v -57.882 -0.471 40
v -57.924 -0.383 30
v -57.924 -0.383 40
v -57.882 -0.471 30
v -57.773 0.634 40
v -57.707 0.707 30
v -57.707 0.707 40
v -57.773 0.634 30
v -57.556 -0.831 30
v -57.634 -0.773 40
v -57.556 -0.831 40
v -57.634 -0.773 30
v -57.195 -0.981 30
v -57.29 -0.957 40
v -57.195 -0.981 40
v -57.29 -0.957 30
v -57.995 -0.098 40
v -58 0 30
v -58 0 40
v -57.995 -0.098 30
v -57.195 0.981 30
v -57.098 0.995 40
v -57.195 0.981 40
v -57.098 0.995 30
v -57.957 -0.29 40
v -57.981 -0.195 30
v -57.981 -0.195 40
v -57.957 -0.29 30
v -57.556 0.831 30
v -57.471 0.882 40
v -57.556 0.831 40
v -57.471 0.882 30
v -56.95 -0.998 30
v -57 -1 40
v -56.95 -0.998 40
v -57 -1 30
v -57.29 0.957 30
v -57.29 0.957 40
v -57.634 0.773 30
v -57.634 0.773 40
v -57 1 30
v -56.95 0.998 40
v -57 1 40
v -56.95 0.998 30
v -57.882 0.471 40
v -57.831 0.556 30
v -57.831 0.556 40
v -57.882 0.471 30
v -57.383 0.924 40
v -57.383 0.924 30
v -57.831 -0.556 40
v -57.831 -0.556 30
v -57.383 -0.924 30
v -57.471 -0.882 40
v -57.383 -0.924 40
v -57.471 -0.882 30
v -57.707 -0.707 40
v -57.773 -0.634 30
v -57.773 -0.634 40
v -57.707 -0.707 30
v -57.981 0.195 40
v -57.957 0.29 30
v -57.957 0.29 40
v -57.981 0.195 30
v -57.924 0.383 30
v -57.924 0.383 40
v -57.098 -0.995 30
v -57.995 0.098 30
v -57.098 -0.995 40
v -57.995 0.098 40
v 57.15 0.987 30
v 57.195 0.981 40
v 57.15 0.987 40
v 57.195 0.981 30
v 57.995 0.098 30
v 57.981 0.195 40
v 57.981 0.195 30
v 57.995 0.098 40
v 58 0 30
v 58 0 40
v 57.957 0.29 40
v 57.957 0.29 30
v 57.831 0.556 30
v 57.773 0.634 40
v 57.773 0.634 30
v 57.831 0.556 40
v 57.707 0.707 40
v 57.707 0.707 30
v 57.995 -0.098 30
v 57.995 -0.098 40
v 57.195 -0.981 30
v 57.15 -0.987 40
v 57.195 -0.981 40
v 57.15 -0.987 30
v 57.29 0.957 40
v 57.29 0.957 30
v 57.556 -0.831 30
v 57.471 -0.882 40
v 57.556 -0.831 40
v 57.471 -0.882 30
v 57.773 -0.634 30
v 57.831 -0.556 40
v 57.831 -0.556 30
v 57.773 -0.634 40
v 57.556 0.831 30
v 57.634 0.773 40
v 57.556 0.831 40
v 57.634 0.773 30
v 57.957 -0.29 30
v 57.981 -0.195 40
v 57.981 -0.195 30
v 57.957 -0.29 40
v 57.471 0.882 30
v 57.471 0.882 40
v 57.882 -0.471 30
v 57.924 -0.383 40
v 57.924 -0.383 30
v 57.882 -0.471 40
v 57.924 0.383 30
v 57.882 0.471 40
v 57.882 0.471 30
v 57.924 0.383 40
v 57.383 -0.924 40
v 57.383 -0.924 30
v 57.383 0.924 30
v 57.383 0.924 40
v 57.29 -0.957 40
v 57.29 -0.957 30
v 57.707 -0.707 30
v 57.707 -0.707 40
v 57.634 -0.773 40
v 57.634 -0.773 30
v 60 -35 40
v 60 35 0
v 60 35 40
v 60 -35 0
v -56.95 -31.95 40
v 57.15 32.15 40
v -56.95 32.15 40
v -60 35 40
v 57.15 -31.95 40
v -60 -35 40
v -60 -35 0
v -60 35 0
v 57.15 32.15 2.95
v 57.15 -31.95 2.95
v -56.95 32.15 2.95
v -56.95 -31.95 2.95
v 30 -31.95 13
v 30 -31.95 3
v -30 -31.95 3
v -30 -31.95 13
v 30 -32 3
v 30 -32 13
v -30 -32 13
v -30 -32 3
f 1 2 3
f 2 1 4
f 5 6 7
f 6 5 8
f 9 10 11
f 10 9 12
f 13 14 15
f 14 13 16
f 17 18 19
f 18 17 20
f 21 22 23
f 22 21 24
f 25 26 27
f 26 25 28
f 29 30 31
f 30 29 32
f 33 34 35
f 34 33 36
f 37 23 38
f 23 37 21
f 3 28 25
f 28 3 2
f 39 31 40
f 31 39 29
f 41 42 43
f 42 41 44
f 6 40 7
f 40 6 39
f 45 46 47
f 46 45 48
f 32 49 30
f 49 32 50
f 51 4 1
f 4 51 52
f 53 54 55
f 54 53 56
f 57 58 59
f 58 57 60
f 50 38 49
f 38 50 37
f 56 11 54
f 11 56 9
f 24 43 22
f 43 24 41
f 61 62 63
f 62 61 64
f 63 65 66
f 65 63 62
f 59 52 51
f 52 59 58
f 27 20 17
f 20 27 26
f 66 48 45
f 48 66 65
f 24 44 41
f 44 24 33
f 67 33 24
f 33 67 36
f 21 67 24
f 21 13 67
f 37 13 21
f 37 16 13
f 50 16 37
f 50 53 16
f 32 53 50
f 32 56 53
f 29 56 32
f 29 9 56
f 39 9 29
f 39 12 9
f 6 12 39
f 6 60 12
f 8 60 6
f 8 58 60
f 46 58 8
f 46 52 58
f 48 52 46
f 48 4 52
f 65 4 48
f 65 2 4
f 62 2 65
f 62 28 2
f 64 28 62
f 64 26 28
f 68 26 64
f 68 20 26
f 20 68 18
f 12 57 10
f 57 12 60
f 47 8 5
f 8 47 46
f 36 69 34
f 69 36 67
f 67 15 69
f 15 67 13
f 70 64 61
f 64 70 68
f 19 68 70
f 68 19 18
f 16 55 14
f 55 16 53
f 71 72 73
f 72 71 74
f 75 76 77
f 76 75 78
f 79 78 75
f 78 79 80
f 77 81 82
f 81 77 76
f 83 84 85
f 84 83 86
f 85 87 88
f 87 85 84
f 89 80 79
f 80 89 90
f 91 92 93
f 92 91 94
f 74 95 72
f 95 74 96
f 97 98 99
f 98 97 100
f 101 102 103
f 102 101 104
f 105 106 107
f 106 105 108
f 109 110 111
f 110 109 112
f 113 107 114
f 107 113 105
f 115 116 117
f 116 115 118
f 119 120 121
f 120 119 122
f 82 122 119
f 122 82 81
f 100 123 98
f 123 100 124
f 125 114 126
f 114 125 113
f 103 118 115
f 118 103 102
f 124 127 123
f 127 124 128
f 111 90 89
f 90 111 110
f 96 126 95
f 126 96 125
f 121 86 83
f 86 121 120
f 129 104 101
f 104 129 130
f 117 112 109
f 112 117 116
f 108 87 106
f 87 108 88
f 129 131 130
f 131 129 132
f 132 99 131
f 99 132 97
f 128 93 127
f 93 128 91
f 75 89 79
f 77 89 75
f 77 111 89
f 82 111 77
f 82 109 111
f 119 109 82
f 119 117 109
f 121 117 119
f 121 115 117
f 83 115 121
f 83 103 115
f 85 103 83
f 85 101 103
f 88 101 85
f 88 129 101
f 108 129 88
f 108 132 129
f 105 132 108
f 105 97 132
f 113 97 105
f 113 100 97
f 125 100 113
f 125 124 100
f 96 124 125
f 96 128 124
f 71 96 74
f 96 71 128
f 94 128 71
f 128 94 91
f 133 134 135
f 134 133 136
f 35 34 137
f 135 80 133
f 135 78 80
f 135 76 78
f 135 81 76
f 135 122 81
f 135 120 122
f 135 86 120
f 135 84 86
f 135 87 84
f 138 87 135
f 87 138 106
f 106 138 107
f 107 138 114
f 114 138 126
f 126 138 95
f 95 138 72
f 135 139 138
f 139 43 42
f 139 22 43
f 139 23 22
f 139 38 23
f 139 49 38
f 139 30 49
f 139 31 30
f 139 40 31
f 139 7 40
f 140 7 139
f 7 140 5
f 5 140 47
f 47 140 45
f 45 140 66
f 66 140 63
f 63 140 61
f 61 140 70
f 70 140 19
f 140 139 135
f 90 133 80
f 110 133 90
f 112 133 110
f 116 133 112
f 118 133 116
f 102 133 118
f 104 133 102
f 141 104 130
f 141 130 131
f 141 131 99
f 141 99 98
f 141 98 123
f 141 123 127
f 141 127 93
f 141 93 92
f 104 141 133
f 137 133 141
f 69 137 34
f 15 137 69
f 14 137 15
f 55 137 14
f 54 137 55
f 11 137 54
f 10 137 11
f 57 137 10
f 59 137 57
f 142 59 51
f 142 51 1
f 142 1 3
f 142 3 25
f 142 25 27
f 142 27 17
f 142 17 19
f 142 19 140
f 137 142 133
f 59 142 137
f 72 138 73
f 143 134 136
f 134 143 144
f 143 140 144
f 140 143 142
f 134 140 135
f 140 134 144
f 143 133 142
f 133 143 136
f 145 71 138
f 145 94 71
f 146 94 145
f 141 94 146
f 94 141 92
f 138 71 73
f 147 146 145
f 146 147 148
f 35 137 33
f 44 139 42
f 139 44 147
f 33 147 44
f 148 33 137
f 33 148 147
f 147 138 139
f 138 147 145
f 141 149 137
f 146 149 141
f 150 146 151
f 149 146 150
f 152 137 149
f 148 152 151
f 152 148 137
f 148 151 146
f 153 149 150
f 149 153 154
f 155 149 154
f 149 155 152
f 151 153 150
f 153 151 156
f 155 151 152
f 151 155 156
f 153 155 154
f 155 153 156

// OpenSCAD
// Mini horizontal gel-electrophoresis buffer tank.
// Outer dimensions: 120 (X) x 70 (Y) x 40 (Z).
// Wall thickness: 3 mm. Floor thickness: 3 mm.
// Inner floor Z = 3 mm.
// Central platform: 60 mm long (X), full inner width (Y), top at Z = 13 mm.
// Electrode holes: 2 mm diameter, horizontal along X, at Y=0, Z=30.

$fn = 64;

// Outer dimensions
X_out = 120;
Y_out = 70;
Z_out = 40;

// Thicknesses
wall_t = 3;
floor_t = 3;

// Inner dimensions
X_in  = X_out - 2 * wall_t; // 114
Y_in  = Y_out - 2 * wall_t; // 64
Z_in  = Z_out - floor_t;    // 37

// Platform dimensions
plat_len = 60;
plat_w   = Y_in;
plat_top = 13; // Absolute Z height of top surface

// Electrode hole parameters
hole_d = 2;
hole_y = 0;
hole_z = 30;

difference() {
    // 1. The solid outer block
    translate([-X_out/2, -Y_out/2, 0]) 
        cube([X_out, Y_out, Z_out]);

    // 2. The inner void (subtracted)
    // This represents the empty space inside the tank.
    // X range: [wall_t, X_out - wall_t]
    // Y range: [wall_t, Y_out - wall_t]
    // Z range: [floor_t, Z_out] (open top)
    
    // We extend the void slightly past the inner faces to ensure clean cuts.
    void_x = X_in + 0.1;
    void_y = Y_in + 0.1;
    void_z = Z_out - floor_t + 0.1; // Extend slightly above the top of the void
    
    translate([-X_out/2 + wall_t + 0.05, -Y_out/2 + wall_t + 0.05, floor_t - 0.05])
        cube([void_x, void_y, void_z]);
    
    // 3. The central platform
    // It sits on the inner floor.
    // Bottom Z = floor_t = 3.
    // Top Z = 13.
    // Length = 60, centered in X.
    // Width = Y_in.
    
    translate([-plat_len/2, -plat_w/2, floor_t])
        cube([plat_len, plat_w, plat_top - floor_t]);
    
    // 4. Electrode holes
    // Two holes, one at each end (X = +/- X_in/2).
    // Hole is a cylinder along X axis.
    // Position: Y = 0, Z = 30.
    // Radius = hole_d / 2.
    
    for (side = [-1, 1]) {
        translate([side * (X_in / 2), hole_y, hole_z])
            cylinder(h = X_in + 0.1, d = hole_d);
    }
}
